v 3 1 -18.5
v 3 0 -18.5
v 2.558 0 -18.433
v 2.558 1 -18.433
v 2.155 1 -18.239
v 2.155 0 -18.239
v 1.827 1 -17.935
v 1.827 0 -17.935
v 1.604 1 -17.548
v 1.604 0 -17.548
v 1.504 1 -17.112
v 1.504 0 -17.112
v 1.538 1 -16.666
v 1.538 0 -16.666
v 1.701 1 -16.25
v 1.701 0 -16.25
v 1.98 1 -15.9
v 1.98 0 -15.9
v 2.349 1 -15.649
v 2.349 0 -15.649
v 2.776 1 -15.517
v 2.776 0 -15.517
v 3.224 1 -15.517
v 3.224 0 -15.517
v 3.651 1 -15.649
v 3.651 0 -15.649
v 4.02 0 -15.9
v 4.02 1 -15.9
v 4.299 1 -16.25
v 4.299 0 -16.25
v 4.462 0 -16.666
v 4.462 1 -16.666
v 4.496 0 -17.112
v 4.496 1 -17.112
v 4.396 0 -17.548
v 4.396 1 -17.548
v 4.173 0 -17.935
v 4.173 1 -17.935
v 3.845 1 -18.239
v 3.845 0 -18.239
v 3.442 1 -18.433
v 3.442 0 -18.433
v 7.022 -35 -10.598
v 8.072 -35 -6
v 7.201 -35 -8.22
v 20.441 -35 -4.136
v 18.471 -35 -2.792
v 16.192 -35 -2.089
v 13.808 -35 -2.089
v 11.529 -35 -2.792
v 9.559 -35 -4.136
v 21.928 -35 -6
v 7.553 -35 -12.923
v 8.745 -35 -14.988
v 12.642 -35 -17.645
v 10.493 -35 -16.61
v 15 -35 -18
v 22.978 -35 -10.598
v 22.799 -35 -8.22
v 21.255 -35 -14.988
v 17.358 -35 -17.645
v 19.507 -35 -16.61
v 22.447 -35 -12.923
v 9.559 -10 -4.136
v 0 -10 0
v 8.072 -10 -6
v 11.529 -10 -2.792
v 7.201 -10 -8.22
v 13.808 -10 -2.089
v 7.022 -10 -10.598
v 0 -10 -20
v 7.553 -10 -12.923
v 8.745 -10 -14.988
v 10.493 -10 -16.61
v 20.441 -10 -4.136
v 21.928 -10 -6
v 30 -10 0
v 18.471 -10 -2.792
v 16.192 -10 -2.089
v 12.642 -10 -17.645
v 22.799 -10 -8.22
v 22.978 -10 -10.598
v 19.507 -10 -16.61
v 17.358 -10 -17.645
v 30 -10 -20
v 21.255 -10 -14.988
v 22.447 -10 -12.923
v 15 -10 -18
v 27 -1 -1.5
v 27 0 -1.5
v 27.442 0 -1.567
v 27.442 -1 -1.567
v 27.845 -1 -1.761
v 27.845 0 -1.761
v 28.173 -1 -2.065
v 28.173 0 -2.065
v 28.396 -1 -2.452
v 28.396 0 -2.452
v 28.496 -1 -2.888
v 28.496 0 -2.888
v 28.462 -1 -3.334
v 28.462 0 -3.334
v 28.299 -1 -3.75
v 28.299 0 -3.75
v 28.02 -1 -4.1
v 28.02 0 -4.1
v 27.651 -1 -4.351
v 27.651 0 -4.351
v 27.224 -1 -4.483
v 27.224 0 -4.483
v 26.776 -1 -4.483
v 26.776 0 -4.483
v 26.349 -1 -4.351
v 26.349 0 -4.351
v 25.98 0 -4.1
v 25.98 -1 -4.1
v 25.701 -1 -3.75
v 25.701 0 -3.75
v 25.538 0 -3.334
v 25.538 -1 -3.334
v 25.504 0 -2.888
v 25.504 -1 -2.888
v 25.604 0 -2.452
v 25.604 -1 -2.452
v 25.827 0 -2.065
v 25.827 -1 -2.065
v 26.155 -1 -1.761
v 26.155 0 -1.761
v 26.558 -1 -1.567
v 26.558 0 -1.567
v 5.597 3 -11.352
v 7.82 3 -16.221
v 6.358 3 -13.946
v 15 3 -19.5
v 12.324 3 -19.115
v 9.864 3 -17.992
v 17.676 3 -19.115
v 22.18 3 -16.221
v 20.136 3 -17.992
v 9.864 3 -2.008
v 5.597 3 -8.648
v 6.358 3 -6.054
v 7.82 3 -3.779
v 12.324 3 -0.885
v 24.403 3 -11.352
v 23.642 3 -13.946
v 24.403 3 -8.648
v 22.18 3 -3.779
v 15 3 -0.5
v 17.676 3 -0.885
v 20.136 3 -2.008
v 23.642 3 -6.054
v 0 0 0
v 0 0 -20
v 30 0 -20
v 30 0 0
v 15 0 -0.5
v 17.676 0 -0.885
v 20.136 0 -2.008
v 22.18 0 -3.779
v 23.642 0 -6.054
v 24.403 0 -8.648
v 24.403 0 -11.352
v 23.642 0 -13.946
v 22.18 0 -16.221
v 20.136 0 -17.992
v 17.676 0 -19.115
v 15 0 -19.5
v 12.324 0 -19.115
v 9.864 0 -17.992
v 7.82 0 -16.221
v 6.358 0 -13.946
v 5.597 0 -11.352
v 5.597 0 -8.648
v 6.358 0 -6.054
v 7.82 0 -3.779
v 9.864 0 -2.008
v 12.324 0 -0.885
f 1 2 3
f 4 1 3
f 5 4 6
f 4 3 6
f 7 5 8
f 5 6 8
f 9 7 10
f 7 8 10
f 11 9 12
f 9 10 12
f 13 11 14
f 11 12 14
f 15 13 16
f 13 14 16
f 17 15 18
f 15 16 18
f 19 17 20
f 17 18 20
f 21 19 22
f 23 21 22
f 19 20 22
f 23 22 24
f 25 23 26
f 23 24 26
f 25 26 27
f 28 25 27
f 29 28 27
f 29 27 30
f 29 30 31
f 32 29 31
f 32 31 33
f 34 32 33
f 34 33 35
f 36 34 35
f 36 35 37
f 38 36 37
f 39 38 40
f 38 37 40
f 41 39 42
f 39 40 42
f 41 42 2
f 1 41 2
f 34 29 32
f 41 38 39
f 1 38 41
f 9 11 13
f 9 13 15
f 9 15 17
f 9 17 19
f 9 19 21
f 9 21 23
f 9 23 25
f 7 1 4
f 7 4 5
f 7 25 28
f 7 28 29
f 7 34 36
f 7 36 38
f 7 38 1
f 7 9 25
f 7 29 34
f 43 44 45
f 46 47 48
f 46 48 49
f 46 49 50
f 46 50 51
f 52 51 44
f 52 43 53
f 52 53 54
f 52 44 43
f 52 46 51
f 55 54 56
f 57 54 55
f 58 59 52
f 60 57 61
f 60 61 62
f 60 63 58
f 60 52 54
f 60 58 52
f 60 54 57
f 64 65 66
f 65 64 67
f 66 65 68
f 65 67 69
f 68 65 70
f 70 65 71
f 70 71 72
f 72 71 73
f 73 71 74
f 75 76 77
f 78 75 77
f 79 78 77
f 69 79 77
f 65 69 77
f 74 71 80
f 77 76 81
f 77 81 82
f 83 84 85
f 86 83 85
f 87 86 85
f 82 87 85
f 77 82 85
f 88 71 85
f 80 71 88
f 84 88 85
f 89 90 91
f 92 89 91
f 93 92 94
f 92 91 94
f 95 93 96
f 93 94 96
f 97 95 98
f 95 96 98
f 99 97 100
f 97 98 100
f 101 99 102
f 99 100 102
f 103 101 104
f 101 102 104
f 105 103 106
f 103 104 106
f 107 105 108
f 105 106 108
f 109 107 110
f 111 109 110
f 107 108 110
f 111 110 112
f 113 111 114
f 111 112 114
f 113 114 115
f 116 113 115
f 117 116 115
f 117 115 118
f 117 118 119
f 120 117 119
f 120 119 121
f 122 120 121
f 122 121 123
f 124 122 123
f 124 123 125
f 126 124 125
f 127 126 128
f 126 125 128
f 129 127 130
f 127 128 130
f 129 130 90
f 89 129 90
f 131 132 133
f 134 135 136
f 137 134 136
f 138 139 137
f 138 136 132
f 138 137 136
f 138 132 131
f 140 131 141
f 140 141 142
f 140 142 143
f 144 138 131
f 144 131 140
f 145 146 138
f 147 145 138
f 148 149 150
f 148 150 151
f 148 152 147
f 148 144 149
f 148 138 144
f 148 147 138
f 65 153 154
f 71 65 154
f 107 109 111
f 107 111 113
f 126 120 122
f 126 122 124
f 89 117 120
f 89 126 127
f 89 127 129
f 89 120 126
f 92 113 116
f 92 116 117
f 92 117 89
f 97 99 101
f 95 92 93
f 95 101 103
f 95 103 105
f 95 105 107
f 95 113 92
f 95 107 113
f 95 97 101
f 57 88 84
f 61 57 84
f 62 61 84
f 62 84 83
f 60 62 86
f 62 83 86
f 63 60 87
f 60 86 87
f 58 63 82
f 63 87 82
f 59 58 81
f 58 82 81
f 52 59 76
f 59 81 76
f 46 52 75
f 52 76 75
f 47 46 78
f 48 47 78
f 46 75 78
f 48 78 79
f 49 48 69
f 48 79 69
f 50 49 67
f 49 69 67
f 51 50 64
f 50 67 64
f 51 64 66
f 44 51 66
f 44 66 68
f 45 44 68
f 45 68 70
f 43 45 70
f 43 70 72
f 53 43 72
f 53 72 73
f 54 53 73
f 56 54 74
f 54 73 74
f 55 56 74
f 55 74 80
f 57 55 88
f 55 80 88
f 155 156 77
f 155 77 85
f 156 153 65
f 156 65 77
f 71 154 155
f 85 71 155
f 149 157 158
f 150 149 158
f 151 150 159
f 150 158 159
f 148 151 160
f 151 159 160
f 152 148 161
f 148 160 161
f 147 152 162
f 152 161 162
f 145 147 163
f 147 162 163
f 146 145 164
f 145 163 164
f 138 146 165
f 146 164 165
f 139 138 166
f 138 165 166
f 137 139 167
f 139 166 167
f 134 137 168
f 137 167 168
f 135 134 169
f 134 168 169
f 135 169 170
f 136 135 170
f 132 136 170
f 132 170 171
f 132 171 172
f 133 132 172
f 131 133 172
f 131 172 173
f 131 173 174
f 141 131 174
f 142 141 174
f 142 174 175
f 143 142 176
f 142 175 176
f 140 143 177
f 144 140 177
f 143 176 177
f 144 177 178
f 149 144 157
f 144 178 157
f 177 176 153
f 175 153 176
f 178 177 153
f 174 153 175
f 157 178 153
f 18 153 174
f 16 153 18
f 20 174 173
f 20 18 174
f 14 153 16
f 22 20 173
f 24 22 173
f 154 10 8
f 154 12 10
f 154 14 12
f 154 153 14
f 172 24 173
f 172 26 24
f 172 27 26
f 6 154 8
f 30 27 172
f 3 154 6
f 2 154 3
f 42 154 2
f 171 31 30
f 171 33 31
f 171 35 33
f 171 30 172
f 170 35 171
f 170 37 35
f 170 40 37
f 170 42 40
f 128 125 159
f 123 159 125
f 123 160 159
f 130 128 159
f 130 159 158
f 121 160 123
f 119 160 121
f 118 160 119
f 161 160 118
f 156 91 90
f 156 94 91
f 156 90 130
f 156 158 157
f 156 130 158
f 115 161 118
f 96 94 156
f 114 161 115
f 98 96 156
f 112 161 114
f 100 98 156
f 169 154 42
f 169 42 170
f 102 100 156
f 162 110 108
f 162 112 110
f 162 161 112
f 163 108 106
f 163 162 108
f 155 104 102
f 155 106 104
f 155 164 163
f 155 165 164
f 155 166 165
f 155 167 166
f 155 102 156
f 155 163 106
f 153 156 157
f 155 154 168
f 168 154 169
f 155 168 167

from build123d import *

# Parameters (mm, degrees)
SKETCH1_W           = 30
SKETCH1_H           = 20
BOSS_EXTRUDE1_DEPTH = 10
SKETCH2_R           = 8
BOSS_EXTRUDE2_DEPTH = 25
SKETCH3_R           = 9.5
BOSS_EXTRUDE3_DEPTH = 3
SKETCH4_R           = 1.5
BOSS_EXTRUDE4_DEPTH = 1
SKETCH5_R           = 1.5
CUT_EXTRUDE1_DEPTH  = 1


with BuildPart() as part:
    # Sketch1 → Boss-Extrude1 (new body)
    with BuildSketch(Plane(origin=(0, 0, 0), x_dir=(1, 0, 0), z_dir=(0, 1, 0))):
        with Locations((15, 10)):
            Rectangle(SKETCH1_W, SKETCH1_H)
    extrude(amount=-BOSS_EXTRUDE1_DEPTH)

    # Sketch2 → Boss-Extrude2 (add)
    with BuildSketch(Plane.XZ.offset(10)):
        with Locations(Location((15, -10, 0), (0, 0, 270))):
            Circle(SKETCH2_R)
    extrude(amount=BOSS_EXTRUDE2_DEPTH)

    # Sketch3 → Boss-Extrude3 (add)
    with BuildSketch(Plane(origin=(0, 0, 0), x_dir=(1, 0, 0), z_dir=(0, 1, 0))):
        with Locations(Location((15, 10, 0), (0, 0, 270))):
            Circle(SKETCH3_R)
    extrude(amount=BOSS_EXTRUDE3_DEPTH)

    # Sketch4 → Boss-Extrude4 (add)
    with BuildSketch(Plane(origin=(0, 0, 0), x_dir=(1, 0, 0), z_dir=(0, 1, 0))):
        with Locations(Location((3, 17, 0), (0, 0, 90))):
            Circle(SKETCH4_R)
    extrude(amount=BOSS_EXTRUDE4_DEPTH)

    # Sketch5 → Cut-Extrude1 (cut)
    with BuildSketch(Plane(origin=(0, 0, 0), x_dir=(1, 0, 0), z_dir=(0, 1, 0))):
        with Locations(Location((27, 3, 0), (0, 0, 270))):
            Circle(SKETCH5_R)
    extrude(amount=-CUT_EXTRUDE1_DEPTH, mode=Mode.SUBTRACT)


solid = part.part
